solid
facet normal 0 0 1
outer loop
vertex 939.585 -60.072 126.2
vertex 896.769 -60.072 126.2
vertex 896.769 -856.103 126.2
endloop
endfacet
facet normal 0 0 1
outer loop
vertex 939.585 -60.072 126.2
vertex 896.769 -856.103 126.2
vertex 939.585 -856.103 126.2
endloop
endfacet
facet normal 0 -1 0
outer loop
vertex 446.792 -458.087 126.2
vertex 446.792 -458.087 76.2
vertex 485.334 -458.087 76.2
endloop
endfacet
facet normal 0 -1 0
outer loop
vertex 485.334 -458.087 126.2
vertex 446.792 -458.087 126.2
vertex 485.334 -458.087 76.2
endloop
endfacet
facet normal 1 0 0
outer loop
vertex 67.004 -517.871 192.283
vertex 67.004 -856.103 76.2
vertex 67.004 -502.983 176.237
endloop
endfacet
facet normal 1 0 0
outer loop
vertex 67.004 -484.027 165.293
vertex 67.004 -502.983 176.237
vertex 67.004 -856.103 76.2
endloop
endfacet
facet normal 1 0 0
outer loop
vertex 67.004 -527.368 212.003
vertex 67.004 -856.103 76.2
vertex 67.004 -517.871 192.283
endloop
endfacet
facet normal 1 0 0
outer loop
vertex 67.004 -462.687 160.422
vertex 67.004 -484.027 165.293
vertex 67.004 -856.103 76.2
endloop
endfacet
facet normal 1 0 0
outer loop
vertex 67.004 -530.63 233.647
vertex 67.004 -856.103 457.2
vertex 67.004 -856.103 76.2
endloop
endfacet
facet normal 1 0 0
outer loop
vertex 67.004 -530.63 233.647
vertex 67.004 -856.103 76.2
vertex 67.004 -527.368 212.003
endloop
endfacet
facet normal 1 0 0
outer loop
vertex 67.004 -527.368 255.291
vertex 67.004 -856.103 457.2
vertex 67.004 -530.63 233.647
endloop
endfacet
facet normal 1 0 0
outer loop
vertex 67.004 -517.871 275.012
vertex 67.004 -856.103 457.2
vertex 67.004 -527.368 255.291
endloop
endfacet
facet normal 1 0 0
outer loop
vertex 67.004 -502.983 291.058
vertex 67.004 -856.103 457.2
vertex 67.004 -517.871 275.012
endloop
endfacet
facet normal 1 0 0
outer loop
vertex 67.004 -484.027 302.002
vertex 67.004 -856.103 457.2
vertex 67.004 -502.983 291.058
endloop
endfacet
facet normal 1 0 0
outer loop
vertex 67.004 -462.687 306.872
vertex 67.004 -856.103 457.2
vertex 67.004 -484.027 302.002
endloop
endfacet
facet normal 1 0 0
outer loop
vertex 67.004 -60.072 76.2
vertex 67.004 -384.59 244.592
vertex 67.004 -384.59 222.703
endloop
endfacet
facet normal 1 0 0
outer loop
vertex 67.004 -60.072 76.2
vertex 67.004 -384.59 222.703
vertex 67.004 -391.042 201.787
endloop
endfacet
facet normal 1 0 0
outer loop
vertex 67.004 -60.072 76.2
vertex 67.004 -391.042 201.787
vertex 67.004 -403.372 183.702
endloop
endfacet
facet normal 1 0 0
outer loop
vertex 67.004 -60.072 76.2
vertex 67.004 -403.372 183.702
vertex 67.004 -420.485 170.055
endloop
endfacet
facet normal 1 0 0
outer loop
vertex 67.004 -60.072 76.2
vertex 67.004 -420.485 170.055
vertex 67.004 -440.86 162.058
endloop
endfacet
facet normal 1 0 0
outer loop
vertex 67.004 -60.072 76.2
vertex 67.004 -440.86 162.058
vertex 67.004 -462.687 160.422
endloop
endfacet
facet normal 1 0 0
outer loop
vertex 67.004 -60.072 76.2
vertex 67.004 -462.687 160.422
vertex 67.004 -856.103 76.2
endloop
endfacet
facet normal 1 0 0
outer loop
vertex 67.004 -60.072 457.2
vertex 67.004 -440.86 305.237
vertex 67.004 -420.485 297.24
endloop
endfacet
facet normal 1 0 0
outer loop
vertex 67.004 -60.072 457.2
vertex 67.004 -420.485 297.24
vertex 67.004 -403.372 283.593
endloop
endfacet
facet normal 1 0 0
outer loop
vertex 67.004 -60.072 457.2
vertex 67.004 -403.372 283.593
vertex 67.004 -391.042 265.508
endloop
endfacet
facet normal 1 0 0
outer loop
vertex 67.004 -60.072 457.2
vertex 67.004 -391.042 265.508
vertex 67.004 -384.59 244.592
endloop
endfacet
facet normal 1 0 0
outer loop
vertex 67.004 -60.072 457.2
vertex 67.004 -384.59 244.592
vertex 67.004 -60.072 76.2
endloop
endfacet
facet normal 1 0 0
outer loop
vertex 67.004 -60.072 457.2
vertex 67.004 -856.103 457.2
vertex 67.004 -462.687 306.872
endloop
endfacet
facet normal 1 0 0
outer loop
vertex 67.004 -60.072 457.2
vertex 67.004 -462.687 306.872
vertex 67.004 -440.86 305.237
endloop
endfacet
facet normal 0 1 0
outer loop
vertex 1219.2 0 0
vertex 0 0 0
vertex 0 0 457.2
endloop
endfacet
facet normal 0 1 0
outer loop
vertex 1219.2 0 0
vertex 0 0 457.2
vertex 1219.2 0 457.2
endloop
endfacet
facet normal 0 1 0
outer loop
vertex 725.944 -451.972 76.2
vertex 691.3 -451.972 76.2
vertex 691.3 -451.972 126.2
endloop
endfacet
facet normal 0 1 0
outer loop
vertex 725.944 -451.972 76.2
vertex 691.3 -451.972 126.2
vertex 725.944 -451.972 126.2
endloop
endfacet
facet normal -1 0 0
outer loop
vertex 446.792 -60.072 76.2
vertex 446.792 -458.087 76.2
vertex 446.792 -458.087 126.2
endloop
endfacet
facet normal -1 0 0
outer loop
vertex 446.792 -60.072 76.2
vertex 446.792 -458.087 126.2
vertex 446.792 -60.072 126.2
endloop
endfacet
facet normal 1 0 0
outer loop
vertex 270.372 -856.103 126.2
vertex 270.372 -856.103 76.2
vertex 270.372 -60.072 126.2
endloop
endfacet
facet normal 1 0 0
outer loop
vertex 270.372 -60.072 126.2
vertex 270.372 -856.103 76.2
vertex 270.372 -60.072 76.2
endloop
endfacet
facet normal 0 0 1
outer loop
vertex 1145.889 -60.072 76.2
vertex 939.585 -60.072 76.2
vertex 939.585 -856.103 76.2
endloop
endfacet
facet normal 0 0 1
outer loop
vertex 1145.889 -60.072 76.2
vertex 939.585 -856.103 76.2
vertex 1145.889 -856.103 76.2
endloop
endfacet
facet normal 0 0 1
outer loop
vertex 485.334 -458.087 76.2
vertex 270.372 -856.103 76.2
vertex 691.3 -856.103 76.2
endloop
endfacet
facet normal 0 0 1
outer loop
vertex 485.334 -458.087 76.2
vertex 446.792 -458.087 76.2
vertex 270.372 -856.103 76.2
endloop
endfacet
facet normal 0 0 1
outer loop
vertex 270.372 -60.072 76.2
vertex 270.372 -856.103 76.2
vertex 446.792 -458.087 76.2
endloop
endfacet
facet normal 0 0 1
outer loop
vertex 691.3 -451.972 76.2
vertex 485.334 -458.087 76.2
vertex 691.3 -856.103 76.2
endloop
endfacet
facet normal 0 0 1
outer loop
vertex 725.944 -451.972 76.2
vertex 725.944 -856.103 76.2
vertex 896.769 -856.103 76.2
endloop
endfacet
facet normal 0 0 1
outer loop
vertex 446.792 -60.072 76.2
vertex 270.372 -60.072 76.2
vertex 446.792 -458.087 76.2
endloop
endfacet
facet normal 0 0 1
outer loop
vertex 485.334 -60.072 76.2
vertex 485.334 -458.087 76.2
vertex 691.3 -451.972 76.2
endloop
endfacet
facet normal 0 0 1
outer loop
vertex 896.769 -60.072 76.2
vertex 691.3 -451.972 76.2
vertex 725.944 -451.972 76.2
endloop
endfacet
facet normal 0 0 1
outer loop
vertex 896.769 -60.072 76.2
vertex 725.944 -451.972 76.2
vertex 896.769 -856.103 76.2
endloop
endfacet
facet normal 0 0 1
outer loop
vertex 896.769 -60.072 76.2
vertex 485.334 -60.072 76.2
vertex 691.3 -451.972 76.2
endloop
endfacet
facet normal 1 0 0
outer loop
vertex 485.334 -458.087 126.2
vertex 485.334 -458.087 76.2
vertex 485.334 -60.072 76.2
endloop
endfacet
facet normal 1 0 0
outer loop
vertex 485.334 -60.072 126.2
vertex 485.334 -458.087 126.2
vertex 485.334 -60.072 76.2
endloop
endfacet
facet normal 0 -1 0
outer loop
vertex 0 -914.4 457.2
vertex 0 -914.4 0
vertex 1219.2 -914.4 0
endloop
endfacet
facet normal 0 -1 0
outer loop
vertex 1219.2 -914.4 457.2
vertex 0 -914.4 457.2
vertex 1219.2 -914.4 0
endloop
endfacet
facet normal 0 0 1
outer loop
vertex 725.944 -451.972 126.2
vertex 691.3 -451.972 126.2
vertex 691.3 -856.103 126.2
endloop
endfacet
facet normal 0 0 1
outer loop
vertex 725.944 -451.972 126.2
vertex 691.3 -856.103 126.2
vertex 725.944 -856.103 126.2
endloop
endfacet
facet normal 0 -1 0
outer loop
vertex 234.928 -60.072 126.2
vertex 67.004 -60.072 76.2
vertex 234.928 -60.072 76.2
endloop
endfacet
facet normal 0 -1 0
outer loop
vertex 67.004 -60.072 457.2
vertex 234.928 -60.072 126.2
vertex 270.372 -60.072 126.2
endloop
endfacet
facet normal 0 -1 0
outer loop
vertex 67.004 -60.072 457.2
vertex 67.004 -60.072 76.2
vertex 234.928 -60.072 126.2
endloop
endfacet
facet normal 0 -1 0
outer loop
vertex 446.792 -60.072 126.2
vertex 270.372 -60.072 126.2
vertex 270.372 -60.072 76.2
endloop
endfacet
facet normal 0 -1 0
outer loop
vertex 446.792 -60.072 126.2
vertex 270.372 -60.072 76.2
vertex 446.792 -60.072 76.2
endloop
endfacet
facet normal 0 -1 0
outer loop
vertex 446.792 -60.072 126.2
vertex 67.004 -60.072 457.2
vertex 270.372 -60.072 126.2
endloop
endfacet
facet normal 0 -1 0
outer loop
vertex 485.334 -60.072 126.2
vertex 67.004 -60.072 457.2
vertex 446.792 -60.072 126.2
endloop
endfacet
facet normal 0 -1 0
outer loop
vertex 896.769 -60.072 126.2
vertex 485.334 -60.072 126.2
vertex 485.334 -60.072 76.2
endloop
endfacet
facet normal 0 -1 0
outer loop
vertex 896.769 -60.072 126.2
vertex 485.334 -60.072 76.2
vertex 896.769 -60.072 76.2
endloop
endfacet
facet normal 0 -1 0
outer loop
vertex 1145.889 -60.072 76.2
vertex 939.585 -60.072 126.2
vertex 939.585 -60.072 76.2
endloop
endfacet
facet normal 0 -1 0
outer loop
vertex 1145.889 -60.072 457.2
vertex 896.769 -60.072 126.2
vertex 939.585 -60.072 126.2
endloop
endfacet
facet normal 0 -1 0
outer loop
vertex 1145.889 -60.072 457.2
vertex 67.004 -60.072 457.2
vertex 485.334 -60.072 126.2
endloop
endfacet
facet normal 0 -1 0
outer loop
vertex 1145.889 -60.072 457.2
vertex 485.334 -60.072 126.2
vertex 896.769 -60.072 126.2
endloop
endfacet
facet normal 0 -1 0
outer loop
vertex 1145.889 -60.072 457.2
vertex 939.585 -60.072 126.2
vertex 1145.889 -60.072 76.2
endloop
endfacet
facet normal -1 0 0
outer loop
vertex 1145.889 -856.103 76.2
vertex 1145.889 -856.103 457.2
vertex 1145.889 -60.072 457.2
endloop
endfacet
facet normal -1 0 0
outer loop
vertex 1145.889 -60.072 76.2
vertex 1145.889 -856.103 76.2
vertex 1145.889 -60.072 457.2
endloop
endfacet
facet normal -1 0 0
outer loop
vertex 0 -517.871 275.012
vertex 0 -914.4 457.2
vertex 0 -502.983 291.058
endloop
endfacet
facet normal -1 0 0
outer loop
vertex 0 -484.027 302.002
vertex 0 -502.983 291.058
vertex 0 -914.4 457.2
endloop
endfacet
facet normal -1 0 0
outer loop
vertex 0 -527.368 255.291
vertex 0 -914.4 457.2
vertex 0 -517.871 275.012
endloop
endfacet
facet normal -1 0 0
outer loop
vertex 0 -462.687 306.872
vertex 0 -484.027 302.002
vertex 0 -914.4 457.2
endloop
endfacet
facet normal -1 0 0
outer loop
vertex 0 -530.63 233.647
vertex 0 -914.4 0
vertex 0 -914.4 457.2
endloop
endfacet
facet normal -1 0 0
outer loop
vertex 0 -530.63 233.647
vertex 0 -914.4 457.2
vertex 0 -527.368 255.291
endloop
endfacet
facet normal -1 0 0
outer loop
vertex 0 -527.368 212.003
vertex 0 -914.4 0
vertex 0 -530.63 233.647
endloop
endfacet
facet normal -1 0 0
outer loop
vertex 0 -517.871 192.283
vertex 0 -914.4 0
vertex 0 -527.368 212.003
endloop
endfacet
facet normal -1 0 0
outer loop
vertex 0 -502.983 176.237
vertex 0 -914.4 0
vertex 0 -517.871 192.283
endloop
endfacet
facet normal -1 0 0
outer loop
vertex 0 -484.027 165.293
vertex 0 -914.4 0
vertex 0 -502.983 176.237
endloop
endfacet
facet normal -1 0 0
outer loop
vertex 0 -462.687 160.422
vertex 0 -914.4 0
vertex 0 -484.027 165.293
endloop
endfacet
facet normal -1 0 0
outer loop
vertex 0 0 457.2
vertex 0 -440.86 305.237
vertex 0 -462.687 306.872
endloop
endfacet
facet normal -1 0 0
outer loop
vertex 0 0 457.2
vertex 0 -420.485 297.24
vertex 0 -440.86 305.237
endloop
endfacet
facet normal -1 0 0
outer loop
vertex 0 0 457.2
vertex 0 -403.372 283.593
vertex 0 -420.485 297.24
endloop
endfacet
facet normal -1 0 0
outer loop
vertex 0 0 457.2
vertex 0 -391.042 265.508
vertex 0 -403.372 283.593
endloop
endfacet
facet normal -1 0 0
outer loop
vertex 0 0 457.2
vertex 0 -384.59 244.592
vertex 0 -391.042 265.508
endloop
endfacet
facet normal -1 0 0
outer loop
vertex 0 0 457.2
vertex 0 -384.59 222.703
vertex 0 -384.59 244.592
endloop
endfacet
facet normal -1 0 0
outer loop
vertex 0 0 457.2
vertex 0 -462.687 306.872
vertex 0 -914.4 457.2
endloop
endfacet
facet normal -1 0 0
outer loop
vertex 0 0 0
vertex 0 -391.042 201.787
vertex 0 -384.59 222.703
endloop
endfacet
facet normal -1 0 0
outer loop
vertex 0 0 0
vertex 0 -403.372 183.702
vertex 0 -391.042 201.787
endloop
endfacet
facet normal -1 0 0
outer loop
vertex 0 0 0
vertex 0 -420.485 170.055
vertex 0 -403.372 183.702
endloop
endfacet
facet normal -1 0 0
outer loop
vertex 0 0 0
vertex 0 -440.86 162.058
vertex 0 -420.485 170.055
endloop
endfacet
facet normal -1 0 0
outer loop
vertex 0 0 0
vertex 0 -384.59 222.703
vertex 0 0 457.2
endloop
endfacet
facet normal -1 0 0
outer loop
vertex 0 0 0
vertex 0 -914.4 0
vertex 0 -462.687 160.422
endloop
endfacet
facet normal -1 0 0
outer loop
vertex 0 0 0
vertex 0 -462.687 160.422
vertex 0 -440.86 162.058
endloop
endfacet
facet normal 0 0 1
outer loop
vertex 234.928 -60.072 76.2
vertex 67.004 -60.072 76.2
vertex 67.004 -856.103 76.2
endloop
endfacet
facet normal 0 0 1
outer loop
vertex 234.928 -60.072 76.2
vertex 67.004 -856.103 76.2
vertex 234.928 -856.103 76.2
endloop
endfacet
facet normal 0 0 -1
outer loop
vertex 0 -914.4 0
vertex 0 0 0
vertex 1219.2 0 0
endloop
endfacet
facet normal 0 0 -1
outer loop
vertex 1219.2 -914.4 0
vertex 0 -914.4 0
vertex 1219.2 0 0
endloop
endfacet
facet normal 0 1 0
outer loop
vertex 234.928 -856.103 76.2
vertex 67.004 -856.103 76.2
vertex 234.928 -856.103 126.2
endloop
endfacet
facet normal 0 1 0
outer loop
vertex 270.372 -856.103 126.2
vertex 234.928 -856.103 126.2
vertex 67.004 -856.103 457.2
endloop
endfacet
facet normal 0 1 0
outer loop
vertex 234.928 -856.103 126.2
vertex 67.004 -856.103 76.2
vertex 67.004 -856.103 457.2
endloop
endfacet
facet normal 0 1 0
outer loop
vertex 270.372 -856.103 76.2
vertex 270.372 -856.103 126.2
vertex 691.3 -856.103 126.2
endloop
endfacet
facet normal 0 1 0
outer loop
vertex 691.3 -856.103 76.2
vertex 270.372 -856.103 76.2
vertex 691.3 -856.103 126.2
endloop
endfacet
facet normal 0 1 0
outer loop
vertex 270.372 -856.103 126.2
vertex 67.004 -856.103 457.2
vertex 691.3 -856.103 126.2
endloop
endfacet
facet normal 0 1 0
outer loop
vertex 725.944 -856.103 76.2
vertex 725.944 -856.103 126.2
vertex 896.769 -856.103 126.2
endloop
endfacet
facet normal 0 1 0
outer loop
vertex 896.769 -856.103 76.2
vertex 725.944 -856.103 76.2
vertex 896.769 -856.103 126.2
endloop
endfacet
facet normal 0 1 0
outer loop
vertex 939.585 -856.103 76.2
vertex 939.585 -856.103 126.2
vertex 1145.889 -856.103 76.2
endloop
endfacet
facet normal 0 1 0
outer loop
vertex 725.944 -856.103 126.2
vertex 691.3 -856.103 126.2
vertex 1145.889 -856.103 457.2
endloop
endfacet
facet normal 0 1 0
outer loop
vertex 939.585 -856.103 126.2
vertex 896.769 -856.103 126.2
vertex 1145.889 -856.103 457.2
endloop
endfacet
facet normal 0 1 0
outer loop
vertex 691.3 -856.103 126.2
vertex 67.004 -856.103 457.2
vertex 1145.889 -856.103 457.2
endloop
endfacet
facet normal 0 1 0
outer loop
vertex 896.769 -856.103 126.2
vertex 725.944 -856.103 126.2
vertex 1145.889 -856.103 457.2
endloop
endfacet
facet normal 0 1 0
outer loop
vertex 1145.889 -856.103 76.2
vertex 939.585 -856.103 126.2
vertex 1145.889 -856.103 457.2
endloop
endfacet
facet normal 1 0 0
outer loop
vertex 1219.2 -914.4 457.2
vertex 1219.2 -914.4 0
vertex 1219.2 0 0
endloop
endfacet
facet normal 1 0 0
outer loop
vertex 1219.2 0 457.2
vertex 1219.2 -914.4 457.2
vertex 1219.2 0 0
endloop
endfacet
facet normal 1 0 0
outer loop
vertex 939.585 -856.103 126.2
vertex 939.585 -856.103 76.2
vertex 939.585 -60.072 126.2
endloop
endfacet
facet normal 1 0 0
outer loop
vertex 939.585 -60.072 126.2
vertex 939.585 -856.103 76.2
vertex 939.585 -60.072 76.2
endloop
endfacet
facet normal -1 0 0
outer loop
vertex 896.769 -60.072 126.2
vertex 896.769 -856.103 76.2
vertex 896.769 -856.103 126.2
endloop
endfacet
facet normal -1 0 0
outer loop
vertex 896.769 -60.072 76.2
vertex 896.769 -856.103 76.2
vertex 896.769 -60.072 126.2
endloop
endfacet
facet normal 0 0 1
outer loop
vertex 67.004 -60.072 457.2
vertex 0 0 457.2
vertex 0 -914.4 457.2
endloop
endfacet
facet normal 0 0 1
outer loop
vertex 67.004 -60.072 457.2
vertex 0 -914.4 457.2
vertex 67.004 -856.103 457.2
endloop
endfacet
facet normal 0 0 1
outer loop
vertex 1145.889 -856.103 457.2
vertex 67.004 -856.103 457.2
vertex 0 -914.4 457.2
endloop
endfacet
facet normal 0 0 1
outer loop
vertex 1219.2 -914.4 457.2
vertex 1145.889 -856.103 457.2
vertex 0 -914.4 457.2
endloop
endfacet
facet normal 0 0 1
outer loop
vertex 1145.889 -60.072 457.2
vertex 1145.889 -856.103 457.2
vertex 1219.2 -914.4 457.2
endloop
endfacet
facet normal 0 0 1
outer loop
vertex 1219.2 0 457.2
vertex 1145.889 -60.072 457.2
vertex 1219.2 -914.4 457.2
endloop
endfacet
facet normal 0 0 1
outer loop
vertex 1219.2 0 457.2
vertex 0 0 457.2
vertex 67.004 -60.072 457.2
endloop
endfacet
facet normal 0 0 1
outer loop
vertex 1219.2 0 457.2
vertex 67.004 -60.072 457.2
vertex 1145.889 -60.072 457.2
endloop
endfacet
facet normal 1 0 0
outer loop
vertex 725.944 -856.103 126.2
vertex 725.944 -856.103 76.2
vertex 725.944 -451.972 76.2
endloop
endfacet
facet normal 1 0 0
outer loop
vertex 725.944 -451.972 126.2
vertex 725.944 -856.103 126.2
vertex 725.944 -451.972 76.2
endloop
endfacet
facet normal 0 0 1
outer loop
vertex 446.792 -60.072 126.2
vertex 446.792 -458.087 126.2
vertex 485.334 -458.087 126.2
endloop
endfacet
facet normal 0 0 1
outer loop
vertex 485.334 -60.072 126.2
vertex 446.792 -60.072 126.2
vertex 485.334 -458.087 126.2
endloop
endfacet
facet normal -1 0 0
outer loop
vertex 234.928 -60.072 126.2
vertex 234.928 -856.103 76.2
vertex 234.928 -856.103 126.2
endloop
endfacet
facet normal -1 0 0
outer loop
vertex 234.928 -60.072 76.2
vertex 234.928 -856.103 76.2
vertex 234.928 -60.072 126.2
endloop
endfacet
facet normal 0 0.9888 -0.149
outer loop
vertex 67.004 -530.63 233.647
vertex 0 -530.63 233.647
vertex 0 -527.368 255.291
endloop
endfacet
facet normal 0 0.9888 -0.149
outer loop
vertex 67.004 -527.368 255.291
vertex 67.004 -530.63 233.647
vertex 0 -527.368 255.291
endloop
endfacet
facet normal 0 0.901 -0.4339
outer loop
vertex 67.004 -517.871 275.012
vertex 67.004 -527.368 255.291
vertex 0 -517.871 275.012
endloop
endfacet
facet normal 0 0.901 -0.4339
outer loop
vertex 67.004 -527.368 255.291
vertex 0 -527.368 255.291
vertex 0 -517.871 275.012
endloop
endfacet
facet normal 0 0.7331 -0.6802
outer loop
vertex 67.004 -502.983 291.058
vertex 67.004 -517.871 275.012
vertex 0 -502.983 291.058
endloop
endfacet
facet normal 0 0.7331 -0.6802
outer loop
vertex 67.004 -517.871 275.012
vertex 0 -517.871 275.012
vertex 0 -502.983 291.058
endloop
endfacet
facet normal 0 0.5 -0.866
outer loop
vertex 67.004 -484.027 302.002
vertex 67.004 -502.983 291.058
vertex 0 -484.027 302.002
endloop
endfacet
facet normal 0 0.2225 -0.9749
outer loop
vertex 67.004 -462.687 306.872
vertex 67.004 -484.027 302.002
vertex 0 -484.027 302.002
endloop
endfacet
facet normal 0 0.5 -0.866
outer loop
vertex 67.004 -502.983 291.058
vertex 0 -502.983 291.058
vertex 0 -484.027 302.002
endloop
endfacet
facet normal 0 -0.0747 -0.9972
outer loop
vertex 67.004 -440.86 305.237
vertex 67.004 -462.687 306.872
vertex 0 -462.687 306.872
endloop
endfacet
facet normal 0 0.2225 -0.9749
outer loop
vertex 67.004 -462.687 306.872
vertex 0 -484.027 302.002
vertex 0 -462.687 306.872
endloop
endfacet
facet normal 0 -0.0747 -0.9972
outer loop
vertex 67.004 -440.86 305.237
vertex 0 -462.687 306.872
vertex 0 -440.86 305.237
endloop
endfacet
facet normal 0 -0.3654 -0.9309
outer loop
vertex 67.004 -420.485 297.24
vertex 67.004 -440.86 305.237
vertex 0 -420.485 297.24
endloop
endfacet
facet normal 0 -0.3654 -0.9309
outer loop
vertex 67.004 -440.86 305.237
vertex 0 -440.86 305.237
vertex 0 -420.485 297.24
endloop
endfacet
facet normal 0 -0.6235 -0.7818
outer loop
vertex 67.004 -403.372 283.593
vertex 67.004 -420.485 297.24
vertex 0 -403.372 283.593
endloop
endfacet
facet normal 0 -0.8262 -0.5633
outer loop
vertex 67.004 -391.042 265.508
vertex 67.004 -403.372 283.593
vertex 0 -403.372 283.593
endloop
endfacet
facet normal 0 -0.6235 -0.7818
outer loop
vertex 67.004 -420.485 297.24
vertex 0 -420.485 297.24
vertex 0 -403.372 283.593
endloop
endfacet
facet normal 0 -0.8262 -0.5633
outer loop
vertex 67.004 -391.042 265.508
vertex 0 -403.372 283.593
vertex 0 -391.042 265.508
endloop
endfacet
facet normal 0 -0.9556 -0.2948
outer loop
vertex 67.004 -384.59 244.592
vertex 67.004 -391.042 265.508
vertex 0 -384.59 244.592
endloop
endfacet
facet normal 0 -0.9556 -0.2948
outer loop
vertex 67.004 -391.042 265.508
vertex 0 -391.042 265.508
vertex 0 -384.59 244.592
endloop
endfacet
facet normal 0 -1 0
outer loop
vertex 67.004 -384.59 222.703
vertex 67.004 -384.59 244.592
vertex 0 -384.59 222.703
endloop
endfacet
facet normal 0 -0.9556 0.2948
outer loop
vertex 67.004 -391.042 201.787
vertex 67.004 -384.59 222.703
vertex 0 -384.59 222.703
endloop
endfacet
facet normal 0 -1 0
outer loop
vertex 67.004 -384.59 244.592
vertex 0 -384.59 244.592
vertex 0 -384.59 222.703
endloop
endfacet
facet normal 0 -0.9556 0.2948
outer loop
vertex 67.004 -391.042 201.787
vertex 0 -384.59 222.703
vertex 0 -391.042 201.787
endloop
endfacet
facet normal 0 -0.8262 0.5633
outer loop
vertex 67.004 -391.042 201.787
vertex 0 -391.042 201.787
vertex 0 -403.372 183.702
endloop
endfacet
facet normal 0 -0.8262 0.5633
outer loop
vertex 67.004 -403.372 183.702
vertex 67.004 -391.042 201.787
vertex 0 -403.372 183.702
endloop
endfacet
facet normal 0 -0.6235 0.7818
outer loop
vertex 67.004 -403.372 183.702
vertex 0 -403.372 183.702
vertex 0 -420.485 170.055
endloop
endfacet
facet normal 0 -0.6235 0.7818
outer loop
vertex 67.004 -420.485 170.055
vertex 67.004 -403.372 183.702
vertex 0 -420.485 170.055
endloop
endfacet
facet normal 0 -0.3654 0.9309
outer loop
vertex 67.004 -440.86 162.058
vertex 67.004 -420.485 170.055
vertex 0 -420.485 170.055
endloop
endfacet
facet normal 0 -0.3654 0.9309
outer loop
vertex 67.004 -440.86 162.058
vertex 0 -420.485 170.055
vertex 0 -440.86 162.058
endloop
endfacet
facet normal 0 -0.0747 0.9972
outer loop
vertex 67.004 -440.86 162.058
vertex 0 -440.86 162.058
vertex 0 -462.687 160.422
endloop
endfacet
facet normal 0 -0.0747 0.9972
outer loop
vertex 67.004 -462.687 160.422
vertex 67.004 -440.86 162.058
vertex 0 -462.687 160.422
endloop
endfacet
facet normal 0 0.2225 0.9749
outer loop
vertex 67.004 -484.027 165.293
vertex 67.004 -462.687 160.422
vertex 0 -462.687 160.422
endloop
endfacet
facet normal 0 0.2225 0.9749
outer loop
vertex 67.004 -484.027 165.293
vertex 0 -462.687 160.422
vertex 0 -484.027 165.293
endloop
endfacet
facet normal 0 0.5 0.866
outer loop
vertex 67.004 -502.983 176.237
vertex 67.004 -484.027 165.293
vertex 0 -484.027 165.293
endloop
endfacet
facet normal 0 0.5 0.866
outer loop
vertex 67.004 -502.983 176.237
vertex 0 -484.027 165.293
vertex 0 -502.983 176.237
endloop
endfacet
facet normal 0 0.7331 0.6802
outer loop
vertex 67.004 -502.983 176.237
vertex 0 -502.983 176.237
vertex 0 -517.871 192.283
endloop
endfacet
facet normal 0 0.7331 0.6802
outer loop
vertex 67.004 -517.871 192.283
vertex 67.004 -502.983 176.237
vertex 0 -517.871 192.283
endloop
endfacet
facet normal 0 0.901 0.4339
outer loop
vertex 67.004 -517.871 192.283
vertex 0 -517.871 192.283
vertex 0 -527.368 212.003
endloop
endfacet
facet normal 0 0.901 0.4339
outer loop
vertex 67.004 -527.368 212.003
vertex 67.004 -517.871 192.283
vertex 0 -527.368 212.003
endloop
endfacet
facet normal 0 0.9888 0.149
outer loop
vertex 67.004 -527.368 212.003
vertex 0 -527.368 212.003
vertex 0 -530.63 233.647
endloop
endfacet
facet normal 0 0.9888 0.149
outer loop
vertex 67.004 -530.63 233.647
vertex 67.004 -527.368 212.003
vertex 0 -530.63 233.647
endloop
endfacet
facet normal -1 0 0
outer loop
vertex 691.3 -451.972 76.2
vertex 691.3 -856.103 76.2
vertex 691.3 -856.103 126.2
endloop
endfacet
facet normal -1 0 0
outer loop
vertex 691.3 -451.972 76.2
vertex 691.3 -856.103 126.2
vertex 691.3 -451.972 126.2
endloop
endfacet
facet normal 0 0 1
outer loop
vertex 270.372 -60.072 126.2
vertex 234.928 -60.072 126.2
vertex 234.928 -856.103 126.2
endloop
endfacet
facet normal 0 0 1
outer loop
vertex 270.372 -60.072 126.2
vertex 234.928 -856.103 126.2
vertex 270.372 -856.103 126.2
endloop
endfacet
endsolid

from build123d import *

# Parameters (mm, degrees)
F0_W     = 1219.2
F0_H     = 914.4
F1_DEPTH = 457.2
F2_W     = 1078.8844227791
F2_H     = 796.030819416
F3_DEPTH = 381
F4_R     = 73.4303316823
F5_DEPTH = 127
F6_W     = 38.5419428349
F6_H     = 398.015409708
F6_W_2   = 34.6445441246
F6_H_2   = 404.1308164597
F6_W_3   = 42.8168773651
F6_H_3   = 796.030819416
F6_W_4   = 35.4440659285
F7_DEPTH = 50


with BuildPart() as f1:
    # F0 (on Top) → F1 (new body)
    with BuildSketch(Plane.XY):
        with Locations((609.6, -457.2)):
            Rectangle(F0_W, F0_H)
    extrude(amount=F1_DEPTH)

    # F2 (on face) → F3 (cut)
    with BuildSketch(Plane.XY.offset(457.2)):
        with Locations((606.4463555813, -458.0872356892)):
            Rectangle(F2_W, F2_H)
    extrude(amount=-F3_DEPTH, mode=Mode.SUBTRACT)

    # F4 (on face) → F5 (cut)
    with BuildSketch(Plane(origin=(0, 0, 0), x_dir=(0, -1, 0), z_dir=(-1, 0, 0))):
        with Locations((457.2, 233.6474359035)):
            Circle(F4_R)
    extrude(amount=-F5_DEPTH, mode=Mode.SUBTRACT)

    # F6 (on face) → F7 (join)
    with BuildSketch(Plane.XY.offset(76.2)):
        with Locations((466.0627692938, -259.0795308352)):
            Rectangle(F6_W, F6_H)
        with Locations((708.6218893528, -654.0372371674)):
            Rectangle(F6_W_2, F6_H_2)
        with Locations((918.1770086288, -458.0872356892)):
            Rectangle(F6_W_3, F6_H_3)
        with Locations((252.6499405503, -458.0872356892)):
            Rectangle(F6_W_4, F6_H_3)
    extrude(amount=F7_DEPTH)


solid = f1.part
